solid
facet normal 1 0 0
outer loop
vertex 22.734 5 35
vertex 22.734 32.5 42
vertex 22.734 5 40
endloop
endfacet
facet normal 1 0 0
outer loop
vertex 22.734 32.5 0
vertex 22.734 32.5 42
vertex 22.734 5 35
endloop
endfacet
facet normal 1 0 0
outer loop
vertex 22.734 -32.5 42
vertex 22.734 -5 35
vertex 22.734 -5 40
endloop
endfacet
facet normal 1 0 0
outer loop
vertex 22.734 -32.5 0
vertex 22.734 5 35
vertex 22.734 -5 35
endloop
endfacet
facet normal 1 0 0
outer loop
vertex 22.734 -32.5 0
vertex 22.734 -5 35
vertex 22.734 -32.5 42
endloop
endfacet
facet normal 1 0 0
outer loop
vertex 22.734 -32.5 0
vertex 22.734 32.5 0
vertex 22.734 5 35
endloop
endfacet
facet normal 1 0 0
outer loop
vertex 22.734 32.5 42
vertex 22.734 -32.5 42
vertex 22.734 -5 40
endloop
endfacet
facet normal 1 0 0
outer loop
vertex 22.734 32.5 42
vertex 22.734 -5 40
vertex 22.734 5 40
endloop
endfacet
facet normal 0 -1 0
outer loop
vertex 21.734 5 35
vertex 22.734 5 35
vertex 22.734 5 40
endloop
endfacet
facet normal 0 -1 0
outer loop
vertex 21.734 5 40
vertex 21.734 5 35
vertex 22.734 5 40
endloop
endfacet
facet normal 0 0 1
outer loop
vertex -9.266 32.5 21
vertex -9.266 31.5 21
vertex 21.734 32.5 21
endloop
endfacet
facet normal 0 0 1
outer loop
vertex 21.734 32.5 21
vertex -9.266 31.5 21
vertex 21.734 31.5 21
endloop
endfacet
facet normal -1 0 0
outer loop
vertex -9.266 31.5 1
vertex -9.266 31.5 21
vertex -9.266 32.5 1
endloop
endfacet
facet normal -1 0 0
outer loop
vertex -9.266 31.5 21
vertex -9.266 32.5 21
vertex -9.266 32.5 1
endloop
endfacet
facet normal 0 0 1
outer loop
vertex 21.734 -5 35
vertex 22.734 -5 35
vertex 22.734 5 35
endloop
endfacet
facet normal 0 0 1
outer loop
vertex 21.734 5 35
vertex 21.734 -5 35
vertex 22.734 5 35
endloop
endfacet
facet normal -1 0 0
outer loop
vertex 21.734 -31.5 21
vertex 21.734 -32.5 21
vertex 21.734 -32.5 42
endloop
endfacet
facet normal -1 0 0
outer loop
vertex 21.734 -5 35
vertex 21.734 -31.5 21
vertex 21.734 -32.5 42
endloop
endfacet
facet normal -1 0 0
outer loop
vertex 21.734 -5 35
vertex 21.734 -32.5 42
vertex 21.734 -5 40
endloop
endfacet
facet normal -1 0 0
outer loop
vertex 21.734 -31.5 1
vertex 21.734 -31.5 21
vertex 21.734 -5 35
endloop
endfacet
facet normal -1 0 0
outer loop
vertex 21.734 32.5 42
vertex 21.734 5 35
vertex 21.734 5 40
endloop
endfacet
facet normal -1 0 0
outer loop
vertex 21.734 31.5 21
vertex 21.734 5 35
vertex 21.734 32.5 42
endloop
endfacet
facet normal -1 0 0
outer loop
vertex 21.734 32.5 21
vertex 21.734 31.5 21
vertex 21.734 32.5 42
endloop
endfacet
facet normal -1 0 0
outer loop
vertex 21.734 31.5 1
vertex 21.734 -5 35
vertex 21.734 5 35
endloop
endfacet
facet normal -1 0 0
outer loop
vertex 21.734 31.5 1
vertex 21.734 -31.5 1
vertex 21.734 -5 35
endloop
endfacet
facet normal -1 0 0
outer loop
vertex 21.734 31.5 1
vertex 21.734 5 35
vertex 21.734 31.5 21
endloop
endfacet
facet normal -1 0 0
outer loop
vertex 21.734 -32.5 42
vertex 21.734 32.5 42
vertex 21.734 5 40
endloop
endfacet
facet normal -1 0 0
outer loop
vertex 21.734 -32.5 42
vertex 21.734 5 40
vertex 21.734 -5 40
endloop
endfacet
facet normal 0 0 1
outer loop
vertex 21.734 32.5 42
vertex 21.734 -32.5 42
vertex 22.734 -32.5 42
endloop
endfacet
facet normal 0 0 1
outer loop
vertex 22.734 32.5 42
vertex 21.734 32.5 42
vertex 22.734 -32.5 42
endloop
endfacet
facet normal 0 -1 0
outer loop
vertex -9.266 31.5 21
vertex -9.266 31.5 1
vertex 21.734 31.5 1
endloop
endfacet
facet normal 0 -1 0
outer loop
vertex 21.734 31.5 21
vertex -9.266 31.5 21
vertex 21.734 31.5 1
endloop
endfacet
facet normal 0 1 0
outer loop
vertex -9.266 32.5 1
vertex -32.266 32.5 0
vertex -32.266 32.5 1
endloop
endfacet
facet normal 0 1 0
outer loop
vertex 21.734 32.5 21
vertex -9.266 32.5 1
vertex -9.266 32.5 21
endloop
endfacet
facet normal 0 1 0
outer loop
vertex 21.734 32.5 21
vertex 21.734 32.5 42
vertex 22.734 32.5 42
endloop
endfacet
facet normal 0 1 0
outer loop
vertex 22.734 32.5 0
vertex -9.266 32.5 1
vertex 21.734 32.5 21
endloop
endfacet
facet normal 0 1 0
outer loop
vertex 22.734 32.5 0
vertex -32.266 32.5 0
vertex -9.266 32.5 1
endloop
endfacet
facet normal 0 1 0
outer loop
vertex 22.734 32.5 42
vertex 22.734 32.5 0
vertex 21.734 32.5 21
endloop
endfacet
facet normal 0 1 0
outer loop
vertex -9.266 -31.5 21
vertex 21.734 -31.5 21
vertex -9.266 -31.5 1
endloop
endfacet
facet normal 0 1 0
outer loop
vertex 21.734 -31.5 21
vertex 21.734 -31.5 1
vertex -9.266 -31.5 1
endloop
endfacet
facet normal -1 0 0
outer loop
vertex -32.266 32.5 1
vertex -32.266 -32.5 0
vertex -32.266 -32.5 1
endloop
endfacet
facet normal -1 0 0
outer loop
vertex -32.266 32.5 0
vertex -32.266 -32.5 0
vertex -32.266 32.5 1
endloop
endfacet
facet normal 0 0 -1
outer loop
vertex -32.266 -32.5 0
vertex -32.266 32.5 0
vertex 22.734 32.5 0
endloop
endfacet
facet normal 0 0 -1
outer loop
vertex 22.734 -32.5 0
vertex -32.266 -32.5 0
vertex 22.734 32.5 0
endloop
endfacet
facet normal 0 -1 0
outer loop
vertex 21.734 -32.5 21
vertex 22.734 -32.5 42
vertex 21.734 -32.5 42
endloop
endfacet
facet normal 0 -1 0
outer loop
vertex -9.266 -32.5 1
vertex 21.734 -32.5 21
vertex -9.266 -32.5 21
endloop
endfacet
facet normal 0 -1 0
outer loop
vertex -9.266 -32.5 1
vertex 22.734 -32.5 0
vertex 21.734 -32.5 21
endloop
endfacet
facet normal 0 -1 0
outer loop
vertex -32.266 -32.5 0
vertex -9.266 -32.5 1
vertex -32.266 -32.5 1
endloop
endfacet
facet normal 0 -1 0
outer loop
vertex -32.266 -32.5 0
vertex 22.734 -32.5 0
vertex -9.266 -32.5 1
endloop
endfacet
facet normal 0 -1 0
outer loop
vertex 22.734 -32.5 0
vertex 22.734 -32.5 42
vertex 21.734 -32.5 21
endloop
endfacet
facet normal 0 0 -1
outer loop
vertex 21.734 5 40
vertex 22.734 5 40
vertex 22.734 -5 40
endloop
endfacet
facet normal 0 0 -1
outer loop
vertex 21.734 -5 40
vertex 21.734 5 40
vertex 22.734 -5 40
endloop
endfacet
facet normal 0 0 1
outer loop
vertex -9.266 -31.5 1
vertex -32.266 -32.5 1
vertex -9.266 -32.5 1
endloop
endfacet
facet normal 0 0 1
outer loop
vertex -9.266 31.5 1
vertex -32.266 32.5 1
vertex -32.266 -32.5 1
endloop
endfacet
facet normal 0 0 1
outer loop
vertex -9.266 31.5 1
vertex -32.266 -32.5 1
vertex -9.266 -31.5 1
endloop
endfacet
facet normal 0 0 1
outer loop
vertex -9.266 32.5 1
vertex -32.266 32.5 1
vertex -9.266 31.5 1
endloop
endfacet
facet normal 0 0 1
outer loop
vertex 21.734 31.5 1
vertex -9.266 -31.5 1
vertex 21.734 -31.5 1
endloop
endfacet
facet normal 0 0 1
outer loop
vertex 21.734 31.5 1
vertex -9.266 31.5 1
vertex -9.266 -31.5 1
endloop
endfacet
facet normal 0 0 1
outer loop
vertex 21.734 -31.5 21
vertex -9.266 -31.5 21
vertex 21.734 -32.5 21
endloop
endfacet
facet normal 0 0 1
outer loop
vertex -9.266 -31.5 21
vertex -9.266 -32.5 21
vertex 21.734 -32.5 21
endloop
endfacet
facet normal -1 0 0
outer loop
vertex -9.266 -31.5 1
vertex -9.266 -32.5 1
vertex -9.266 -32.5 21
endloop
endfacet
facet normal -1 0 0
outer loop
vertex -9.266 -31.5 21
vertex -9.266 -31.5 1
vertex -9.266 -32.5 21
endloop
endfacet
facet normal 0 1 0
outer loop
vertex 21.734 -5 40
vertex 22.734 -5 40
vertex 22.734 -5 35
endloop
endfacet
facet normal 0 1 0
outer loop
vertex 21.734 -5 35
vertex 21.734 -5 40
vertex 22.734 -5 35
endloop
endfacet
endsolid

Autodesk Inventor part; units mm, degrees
ref_plane "YZ Plane" through (0, 0, 0) normal (1, 0, 0) x (0, 1, 0)
ref_plane "XZ Plane" through (0, 0, 0) normal (0, 1, 0) x (-1, 0, 0)
sketch "Sketch2" plane through (0, 0, 0) normal (0, 0, 1) x (1, 0, 0)
  line L0 (-32.2657, 32.5) -> (21.7343, 32.5)
  line L1 (21.7343, 32.5) -> (21.7343, -32.5)
  line L2 (21.7343, -32.5) -> (-32.2657, -32.5)
  line L3 (-32.2657, -32.5) -> (-32.2657, 32.5)
  line L4 (-43.0657, 0) -> (32.5343, 0) projected
  point P0 (0, 0)
  dimension "d13" = 54
  dimension "d14" = 65
extrude "Extrusion2" add sketch "Sketch2" along normal blind 1
sketch "Sketch3" plane through (21.7343, -32.5, 0) normal (1, 0, 0) x (0, 0, -1)
  line L0 (0, 0) -> (-21, 0)
  line L1 (-21, 0) -> (-21, 65)
  line L2 (-21, 65) -> (0, 65)
  line L3 (0, 65) -> (0, 0)
  line L4 (-1, 0) -> (-1, 65) projected
  line L5 (0, 65) -> (0, 0) projected
  line L6 (0, 65) -> (-1, 65) projected
  point P0 (0, 32.5)
  dimension "d9" = 20
extrude "Extrusion3" add sketch "Sketch3" along normal blind 1
sketch "Sketch4" plane through (21.7343, 32.5, 21) normal (0, 1, 0) x (1, 0, 0)
  line L0 (0, 20) -> (-54, 20) projected
  line L1 (0, 0) -> (0, 20) projected
  line L2 (-31, 20) -> (0, 20)
  line L3 (0, 20) -> (0, 0)
  line L4 (0, 0) -> (-31, 0)
  line L5 (-31, 0) -> (-31, 20)
  line L6 (1, 21) -> (1, 0) projected
  point P0 (-21.7343, 21)
  dimension "d15" = 32
extrude "Extrusion4" add sketch "Sketch4" against normal blind 1
ref_plane "Work Plane2" through (21.7343, 0, 1) normal (0, -1, 0) x (1, 0, 0)
mirror "Mirror3" about plane through (21.7343, 0, 1) normal (0, -1, 0) of "Extrusion4"
sketch "Sketch5" plane through (22.7343, -32.5, 21) normal (0, 0, 1) x (1, 0, 0)
  line L0 (-1, 64) -> (-32, 64) projected
  line L1 (-1, 64) -> (-1, 65)
  line L2 (-55, 65) -> (0, 65) projected
  line L3 (-32, 1) -> (-1, 1) projected
  line L4 (-1, 1) -> (-1, 0)
  line L5 (0, 0) -> (-55, 0) projected
  line L6 (-1, 1) -> (-1, 64) projected
  line L7 (0, 65) -> (0, 0) projected
  line L8 (0, 65) -> (-32, 65) projected
  line L9 (0, 0) -> (-32, 0) projected
  point P0 (-22.7343, 32.5)
extrude "Extrusion5" add sketch "Sketch5" along normal blind 21
sketch "Sketch6" plane through (22.7343, -32.5, 0) normal (1, 0, 0) x (0, 0, -1)
  line L0 (-35, 37.5) -> (-40, 37.5)
  line L1 (-40, 37.5) -> (-40, 27.5)
  line L2 (-40, 27.5) -> (-35, 27.5)
  line L3 (-35, 27.5) -> (-35, 37.5)
  line L4 (-42, 0) -> (-42, 65) projected
  line L5 (0, 32.5) -> (-42, 32.5) construction
  dimension "d18" = 2
  dimension "d19" = 5
  dimension "d20" = 10
extrude "Extrusion6" cut sketch "Sketch6" against normal up to next
properties part number "ProjectXBaseTop"
